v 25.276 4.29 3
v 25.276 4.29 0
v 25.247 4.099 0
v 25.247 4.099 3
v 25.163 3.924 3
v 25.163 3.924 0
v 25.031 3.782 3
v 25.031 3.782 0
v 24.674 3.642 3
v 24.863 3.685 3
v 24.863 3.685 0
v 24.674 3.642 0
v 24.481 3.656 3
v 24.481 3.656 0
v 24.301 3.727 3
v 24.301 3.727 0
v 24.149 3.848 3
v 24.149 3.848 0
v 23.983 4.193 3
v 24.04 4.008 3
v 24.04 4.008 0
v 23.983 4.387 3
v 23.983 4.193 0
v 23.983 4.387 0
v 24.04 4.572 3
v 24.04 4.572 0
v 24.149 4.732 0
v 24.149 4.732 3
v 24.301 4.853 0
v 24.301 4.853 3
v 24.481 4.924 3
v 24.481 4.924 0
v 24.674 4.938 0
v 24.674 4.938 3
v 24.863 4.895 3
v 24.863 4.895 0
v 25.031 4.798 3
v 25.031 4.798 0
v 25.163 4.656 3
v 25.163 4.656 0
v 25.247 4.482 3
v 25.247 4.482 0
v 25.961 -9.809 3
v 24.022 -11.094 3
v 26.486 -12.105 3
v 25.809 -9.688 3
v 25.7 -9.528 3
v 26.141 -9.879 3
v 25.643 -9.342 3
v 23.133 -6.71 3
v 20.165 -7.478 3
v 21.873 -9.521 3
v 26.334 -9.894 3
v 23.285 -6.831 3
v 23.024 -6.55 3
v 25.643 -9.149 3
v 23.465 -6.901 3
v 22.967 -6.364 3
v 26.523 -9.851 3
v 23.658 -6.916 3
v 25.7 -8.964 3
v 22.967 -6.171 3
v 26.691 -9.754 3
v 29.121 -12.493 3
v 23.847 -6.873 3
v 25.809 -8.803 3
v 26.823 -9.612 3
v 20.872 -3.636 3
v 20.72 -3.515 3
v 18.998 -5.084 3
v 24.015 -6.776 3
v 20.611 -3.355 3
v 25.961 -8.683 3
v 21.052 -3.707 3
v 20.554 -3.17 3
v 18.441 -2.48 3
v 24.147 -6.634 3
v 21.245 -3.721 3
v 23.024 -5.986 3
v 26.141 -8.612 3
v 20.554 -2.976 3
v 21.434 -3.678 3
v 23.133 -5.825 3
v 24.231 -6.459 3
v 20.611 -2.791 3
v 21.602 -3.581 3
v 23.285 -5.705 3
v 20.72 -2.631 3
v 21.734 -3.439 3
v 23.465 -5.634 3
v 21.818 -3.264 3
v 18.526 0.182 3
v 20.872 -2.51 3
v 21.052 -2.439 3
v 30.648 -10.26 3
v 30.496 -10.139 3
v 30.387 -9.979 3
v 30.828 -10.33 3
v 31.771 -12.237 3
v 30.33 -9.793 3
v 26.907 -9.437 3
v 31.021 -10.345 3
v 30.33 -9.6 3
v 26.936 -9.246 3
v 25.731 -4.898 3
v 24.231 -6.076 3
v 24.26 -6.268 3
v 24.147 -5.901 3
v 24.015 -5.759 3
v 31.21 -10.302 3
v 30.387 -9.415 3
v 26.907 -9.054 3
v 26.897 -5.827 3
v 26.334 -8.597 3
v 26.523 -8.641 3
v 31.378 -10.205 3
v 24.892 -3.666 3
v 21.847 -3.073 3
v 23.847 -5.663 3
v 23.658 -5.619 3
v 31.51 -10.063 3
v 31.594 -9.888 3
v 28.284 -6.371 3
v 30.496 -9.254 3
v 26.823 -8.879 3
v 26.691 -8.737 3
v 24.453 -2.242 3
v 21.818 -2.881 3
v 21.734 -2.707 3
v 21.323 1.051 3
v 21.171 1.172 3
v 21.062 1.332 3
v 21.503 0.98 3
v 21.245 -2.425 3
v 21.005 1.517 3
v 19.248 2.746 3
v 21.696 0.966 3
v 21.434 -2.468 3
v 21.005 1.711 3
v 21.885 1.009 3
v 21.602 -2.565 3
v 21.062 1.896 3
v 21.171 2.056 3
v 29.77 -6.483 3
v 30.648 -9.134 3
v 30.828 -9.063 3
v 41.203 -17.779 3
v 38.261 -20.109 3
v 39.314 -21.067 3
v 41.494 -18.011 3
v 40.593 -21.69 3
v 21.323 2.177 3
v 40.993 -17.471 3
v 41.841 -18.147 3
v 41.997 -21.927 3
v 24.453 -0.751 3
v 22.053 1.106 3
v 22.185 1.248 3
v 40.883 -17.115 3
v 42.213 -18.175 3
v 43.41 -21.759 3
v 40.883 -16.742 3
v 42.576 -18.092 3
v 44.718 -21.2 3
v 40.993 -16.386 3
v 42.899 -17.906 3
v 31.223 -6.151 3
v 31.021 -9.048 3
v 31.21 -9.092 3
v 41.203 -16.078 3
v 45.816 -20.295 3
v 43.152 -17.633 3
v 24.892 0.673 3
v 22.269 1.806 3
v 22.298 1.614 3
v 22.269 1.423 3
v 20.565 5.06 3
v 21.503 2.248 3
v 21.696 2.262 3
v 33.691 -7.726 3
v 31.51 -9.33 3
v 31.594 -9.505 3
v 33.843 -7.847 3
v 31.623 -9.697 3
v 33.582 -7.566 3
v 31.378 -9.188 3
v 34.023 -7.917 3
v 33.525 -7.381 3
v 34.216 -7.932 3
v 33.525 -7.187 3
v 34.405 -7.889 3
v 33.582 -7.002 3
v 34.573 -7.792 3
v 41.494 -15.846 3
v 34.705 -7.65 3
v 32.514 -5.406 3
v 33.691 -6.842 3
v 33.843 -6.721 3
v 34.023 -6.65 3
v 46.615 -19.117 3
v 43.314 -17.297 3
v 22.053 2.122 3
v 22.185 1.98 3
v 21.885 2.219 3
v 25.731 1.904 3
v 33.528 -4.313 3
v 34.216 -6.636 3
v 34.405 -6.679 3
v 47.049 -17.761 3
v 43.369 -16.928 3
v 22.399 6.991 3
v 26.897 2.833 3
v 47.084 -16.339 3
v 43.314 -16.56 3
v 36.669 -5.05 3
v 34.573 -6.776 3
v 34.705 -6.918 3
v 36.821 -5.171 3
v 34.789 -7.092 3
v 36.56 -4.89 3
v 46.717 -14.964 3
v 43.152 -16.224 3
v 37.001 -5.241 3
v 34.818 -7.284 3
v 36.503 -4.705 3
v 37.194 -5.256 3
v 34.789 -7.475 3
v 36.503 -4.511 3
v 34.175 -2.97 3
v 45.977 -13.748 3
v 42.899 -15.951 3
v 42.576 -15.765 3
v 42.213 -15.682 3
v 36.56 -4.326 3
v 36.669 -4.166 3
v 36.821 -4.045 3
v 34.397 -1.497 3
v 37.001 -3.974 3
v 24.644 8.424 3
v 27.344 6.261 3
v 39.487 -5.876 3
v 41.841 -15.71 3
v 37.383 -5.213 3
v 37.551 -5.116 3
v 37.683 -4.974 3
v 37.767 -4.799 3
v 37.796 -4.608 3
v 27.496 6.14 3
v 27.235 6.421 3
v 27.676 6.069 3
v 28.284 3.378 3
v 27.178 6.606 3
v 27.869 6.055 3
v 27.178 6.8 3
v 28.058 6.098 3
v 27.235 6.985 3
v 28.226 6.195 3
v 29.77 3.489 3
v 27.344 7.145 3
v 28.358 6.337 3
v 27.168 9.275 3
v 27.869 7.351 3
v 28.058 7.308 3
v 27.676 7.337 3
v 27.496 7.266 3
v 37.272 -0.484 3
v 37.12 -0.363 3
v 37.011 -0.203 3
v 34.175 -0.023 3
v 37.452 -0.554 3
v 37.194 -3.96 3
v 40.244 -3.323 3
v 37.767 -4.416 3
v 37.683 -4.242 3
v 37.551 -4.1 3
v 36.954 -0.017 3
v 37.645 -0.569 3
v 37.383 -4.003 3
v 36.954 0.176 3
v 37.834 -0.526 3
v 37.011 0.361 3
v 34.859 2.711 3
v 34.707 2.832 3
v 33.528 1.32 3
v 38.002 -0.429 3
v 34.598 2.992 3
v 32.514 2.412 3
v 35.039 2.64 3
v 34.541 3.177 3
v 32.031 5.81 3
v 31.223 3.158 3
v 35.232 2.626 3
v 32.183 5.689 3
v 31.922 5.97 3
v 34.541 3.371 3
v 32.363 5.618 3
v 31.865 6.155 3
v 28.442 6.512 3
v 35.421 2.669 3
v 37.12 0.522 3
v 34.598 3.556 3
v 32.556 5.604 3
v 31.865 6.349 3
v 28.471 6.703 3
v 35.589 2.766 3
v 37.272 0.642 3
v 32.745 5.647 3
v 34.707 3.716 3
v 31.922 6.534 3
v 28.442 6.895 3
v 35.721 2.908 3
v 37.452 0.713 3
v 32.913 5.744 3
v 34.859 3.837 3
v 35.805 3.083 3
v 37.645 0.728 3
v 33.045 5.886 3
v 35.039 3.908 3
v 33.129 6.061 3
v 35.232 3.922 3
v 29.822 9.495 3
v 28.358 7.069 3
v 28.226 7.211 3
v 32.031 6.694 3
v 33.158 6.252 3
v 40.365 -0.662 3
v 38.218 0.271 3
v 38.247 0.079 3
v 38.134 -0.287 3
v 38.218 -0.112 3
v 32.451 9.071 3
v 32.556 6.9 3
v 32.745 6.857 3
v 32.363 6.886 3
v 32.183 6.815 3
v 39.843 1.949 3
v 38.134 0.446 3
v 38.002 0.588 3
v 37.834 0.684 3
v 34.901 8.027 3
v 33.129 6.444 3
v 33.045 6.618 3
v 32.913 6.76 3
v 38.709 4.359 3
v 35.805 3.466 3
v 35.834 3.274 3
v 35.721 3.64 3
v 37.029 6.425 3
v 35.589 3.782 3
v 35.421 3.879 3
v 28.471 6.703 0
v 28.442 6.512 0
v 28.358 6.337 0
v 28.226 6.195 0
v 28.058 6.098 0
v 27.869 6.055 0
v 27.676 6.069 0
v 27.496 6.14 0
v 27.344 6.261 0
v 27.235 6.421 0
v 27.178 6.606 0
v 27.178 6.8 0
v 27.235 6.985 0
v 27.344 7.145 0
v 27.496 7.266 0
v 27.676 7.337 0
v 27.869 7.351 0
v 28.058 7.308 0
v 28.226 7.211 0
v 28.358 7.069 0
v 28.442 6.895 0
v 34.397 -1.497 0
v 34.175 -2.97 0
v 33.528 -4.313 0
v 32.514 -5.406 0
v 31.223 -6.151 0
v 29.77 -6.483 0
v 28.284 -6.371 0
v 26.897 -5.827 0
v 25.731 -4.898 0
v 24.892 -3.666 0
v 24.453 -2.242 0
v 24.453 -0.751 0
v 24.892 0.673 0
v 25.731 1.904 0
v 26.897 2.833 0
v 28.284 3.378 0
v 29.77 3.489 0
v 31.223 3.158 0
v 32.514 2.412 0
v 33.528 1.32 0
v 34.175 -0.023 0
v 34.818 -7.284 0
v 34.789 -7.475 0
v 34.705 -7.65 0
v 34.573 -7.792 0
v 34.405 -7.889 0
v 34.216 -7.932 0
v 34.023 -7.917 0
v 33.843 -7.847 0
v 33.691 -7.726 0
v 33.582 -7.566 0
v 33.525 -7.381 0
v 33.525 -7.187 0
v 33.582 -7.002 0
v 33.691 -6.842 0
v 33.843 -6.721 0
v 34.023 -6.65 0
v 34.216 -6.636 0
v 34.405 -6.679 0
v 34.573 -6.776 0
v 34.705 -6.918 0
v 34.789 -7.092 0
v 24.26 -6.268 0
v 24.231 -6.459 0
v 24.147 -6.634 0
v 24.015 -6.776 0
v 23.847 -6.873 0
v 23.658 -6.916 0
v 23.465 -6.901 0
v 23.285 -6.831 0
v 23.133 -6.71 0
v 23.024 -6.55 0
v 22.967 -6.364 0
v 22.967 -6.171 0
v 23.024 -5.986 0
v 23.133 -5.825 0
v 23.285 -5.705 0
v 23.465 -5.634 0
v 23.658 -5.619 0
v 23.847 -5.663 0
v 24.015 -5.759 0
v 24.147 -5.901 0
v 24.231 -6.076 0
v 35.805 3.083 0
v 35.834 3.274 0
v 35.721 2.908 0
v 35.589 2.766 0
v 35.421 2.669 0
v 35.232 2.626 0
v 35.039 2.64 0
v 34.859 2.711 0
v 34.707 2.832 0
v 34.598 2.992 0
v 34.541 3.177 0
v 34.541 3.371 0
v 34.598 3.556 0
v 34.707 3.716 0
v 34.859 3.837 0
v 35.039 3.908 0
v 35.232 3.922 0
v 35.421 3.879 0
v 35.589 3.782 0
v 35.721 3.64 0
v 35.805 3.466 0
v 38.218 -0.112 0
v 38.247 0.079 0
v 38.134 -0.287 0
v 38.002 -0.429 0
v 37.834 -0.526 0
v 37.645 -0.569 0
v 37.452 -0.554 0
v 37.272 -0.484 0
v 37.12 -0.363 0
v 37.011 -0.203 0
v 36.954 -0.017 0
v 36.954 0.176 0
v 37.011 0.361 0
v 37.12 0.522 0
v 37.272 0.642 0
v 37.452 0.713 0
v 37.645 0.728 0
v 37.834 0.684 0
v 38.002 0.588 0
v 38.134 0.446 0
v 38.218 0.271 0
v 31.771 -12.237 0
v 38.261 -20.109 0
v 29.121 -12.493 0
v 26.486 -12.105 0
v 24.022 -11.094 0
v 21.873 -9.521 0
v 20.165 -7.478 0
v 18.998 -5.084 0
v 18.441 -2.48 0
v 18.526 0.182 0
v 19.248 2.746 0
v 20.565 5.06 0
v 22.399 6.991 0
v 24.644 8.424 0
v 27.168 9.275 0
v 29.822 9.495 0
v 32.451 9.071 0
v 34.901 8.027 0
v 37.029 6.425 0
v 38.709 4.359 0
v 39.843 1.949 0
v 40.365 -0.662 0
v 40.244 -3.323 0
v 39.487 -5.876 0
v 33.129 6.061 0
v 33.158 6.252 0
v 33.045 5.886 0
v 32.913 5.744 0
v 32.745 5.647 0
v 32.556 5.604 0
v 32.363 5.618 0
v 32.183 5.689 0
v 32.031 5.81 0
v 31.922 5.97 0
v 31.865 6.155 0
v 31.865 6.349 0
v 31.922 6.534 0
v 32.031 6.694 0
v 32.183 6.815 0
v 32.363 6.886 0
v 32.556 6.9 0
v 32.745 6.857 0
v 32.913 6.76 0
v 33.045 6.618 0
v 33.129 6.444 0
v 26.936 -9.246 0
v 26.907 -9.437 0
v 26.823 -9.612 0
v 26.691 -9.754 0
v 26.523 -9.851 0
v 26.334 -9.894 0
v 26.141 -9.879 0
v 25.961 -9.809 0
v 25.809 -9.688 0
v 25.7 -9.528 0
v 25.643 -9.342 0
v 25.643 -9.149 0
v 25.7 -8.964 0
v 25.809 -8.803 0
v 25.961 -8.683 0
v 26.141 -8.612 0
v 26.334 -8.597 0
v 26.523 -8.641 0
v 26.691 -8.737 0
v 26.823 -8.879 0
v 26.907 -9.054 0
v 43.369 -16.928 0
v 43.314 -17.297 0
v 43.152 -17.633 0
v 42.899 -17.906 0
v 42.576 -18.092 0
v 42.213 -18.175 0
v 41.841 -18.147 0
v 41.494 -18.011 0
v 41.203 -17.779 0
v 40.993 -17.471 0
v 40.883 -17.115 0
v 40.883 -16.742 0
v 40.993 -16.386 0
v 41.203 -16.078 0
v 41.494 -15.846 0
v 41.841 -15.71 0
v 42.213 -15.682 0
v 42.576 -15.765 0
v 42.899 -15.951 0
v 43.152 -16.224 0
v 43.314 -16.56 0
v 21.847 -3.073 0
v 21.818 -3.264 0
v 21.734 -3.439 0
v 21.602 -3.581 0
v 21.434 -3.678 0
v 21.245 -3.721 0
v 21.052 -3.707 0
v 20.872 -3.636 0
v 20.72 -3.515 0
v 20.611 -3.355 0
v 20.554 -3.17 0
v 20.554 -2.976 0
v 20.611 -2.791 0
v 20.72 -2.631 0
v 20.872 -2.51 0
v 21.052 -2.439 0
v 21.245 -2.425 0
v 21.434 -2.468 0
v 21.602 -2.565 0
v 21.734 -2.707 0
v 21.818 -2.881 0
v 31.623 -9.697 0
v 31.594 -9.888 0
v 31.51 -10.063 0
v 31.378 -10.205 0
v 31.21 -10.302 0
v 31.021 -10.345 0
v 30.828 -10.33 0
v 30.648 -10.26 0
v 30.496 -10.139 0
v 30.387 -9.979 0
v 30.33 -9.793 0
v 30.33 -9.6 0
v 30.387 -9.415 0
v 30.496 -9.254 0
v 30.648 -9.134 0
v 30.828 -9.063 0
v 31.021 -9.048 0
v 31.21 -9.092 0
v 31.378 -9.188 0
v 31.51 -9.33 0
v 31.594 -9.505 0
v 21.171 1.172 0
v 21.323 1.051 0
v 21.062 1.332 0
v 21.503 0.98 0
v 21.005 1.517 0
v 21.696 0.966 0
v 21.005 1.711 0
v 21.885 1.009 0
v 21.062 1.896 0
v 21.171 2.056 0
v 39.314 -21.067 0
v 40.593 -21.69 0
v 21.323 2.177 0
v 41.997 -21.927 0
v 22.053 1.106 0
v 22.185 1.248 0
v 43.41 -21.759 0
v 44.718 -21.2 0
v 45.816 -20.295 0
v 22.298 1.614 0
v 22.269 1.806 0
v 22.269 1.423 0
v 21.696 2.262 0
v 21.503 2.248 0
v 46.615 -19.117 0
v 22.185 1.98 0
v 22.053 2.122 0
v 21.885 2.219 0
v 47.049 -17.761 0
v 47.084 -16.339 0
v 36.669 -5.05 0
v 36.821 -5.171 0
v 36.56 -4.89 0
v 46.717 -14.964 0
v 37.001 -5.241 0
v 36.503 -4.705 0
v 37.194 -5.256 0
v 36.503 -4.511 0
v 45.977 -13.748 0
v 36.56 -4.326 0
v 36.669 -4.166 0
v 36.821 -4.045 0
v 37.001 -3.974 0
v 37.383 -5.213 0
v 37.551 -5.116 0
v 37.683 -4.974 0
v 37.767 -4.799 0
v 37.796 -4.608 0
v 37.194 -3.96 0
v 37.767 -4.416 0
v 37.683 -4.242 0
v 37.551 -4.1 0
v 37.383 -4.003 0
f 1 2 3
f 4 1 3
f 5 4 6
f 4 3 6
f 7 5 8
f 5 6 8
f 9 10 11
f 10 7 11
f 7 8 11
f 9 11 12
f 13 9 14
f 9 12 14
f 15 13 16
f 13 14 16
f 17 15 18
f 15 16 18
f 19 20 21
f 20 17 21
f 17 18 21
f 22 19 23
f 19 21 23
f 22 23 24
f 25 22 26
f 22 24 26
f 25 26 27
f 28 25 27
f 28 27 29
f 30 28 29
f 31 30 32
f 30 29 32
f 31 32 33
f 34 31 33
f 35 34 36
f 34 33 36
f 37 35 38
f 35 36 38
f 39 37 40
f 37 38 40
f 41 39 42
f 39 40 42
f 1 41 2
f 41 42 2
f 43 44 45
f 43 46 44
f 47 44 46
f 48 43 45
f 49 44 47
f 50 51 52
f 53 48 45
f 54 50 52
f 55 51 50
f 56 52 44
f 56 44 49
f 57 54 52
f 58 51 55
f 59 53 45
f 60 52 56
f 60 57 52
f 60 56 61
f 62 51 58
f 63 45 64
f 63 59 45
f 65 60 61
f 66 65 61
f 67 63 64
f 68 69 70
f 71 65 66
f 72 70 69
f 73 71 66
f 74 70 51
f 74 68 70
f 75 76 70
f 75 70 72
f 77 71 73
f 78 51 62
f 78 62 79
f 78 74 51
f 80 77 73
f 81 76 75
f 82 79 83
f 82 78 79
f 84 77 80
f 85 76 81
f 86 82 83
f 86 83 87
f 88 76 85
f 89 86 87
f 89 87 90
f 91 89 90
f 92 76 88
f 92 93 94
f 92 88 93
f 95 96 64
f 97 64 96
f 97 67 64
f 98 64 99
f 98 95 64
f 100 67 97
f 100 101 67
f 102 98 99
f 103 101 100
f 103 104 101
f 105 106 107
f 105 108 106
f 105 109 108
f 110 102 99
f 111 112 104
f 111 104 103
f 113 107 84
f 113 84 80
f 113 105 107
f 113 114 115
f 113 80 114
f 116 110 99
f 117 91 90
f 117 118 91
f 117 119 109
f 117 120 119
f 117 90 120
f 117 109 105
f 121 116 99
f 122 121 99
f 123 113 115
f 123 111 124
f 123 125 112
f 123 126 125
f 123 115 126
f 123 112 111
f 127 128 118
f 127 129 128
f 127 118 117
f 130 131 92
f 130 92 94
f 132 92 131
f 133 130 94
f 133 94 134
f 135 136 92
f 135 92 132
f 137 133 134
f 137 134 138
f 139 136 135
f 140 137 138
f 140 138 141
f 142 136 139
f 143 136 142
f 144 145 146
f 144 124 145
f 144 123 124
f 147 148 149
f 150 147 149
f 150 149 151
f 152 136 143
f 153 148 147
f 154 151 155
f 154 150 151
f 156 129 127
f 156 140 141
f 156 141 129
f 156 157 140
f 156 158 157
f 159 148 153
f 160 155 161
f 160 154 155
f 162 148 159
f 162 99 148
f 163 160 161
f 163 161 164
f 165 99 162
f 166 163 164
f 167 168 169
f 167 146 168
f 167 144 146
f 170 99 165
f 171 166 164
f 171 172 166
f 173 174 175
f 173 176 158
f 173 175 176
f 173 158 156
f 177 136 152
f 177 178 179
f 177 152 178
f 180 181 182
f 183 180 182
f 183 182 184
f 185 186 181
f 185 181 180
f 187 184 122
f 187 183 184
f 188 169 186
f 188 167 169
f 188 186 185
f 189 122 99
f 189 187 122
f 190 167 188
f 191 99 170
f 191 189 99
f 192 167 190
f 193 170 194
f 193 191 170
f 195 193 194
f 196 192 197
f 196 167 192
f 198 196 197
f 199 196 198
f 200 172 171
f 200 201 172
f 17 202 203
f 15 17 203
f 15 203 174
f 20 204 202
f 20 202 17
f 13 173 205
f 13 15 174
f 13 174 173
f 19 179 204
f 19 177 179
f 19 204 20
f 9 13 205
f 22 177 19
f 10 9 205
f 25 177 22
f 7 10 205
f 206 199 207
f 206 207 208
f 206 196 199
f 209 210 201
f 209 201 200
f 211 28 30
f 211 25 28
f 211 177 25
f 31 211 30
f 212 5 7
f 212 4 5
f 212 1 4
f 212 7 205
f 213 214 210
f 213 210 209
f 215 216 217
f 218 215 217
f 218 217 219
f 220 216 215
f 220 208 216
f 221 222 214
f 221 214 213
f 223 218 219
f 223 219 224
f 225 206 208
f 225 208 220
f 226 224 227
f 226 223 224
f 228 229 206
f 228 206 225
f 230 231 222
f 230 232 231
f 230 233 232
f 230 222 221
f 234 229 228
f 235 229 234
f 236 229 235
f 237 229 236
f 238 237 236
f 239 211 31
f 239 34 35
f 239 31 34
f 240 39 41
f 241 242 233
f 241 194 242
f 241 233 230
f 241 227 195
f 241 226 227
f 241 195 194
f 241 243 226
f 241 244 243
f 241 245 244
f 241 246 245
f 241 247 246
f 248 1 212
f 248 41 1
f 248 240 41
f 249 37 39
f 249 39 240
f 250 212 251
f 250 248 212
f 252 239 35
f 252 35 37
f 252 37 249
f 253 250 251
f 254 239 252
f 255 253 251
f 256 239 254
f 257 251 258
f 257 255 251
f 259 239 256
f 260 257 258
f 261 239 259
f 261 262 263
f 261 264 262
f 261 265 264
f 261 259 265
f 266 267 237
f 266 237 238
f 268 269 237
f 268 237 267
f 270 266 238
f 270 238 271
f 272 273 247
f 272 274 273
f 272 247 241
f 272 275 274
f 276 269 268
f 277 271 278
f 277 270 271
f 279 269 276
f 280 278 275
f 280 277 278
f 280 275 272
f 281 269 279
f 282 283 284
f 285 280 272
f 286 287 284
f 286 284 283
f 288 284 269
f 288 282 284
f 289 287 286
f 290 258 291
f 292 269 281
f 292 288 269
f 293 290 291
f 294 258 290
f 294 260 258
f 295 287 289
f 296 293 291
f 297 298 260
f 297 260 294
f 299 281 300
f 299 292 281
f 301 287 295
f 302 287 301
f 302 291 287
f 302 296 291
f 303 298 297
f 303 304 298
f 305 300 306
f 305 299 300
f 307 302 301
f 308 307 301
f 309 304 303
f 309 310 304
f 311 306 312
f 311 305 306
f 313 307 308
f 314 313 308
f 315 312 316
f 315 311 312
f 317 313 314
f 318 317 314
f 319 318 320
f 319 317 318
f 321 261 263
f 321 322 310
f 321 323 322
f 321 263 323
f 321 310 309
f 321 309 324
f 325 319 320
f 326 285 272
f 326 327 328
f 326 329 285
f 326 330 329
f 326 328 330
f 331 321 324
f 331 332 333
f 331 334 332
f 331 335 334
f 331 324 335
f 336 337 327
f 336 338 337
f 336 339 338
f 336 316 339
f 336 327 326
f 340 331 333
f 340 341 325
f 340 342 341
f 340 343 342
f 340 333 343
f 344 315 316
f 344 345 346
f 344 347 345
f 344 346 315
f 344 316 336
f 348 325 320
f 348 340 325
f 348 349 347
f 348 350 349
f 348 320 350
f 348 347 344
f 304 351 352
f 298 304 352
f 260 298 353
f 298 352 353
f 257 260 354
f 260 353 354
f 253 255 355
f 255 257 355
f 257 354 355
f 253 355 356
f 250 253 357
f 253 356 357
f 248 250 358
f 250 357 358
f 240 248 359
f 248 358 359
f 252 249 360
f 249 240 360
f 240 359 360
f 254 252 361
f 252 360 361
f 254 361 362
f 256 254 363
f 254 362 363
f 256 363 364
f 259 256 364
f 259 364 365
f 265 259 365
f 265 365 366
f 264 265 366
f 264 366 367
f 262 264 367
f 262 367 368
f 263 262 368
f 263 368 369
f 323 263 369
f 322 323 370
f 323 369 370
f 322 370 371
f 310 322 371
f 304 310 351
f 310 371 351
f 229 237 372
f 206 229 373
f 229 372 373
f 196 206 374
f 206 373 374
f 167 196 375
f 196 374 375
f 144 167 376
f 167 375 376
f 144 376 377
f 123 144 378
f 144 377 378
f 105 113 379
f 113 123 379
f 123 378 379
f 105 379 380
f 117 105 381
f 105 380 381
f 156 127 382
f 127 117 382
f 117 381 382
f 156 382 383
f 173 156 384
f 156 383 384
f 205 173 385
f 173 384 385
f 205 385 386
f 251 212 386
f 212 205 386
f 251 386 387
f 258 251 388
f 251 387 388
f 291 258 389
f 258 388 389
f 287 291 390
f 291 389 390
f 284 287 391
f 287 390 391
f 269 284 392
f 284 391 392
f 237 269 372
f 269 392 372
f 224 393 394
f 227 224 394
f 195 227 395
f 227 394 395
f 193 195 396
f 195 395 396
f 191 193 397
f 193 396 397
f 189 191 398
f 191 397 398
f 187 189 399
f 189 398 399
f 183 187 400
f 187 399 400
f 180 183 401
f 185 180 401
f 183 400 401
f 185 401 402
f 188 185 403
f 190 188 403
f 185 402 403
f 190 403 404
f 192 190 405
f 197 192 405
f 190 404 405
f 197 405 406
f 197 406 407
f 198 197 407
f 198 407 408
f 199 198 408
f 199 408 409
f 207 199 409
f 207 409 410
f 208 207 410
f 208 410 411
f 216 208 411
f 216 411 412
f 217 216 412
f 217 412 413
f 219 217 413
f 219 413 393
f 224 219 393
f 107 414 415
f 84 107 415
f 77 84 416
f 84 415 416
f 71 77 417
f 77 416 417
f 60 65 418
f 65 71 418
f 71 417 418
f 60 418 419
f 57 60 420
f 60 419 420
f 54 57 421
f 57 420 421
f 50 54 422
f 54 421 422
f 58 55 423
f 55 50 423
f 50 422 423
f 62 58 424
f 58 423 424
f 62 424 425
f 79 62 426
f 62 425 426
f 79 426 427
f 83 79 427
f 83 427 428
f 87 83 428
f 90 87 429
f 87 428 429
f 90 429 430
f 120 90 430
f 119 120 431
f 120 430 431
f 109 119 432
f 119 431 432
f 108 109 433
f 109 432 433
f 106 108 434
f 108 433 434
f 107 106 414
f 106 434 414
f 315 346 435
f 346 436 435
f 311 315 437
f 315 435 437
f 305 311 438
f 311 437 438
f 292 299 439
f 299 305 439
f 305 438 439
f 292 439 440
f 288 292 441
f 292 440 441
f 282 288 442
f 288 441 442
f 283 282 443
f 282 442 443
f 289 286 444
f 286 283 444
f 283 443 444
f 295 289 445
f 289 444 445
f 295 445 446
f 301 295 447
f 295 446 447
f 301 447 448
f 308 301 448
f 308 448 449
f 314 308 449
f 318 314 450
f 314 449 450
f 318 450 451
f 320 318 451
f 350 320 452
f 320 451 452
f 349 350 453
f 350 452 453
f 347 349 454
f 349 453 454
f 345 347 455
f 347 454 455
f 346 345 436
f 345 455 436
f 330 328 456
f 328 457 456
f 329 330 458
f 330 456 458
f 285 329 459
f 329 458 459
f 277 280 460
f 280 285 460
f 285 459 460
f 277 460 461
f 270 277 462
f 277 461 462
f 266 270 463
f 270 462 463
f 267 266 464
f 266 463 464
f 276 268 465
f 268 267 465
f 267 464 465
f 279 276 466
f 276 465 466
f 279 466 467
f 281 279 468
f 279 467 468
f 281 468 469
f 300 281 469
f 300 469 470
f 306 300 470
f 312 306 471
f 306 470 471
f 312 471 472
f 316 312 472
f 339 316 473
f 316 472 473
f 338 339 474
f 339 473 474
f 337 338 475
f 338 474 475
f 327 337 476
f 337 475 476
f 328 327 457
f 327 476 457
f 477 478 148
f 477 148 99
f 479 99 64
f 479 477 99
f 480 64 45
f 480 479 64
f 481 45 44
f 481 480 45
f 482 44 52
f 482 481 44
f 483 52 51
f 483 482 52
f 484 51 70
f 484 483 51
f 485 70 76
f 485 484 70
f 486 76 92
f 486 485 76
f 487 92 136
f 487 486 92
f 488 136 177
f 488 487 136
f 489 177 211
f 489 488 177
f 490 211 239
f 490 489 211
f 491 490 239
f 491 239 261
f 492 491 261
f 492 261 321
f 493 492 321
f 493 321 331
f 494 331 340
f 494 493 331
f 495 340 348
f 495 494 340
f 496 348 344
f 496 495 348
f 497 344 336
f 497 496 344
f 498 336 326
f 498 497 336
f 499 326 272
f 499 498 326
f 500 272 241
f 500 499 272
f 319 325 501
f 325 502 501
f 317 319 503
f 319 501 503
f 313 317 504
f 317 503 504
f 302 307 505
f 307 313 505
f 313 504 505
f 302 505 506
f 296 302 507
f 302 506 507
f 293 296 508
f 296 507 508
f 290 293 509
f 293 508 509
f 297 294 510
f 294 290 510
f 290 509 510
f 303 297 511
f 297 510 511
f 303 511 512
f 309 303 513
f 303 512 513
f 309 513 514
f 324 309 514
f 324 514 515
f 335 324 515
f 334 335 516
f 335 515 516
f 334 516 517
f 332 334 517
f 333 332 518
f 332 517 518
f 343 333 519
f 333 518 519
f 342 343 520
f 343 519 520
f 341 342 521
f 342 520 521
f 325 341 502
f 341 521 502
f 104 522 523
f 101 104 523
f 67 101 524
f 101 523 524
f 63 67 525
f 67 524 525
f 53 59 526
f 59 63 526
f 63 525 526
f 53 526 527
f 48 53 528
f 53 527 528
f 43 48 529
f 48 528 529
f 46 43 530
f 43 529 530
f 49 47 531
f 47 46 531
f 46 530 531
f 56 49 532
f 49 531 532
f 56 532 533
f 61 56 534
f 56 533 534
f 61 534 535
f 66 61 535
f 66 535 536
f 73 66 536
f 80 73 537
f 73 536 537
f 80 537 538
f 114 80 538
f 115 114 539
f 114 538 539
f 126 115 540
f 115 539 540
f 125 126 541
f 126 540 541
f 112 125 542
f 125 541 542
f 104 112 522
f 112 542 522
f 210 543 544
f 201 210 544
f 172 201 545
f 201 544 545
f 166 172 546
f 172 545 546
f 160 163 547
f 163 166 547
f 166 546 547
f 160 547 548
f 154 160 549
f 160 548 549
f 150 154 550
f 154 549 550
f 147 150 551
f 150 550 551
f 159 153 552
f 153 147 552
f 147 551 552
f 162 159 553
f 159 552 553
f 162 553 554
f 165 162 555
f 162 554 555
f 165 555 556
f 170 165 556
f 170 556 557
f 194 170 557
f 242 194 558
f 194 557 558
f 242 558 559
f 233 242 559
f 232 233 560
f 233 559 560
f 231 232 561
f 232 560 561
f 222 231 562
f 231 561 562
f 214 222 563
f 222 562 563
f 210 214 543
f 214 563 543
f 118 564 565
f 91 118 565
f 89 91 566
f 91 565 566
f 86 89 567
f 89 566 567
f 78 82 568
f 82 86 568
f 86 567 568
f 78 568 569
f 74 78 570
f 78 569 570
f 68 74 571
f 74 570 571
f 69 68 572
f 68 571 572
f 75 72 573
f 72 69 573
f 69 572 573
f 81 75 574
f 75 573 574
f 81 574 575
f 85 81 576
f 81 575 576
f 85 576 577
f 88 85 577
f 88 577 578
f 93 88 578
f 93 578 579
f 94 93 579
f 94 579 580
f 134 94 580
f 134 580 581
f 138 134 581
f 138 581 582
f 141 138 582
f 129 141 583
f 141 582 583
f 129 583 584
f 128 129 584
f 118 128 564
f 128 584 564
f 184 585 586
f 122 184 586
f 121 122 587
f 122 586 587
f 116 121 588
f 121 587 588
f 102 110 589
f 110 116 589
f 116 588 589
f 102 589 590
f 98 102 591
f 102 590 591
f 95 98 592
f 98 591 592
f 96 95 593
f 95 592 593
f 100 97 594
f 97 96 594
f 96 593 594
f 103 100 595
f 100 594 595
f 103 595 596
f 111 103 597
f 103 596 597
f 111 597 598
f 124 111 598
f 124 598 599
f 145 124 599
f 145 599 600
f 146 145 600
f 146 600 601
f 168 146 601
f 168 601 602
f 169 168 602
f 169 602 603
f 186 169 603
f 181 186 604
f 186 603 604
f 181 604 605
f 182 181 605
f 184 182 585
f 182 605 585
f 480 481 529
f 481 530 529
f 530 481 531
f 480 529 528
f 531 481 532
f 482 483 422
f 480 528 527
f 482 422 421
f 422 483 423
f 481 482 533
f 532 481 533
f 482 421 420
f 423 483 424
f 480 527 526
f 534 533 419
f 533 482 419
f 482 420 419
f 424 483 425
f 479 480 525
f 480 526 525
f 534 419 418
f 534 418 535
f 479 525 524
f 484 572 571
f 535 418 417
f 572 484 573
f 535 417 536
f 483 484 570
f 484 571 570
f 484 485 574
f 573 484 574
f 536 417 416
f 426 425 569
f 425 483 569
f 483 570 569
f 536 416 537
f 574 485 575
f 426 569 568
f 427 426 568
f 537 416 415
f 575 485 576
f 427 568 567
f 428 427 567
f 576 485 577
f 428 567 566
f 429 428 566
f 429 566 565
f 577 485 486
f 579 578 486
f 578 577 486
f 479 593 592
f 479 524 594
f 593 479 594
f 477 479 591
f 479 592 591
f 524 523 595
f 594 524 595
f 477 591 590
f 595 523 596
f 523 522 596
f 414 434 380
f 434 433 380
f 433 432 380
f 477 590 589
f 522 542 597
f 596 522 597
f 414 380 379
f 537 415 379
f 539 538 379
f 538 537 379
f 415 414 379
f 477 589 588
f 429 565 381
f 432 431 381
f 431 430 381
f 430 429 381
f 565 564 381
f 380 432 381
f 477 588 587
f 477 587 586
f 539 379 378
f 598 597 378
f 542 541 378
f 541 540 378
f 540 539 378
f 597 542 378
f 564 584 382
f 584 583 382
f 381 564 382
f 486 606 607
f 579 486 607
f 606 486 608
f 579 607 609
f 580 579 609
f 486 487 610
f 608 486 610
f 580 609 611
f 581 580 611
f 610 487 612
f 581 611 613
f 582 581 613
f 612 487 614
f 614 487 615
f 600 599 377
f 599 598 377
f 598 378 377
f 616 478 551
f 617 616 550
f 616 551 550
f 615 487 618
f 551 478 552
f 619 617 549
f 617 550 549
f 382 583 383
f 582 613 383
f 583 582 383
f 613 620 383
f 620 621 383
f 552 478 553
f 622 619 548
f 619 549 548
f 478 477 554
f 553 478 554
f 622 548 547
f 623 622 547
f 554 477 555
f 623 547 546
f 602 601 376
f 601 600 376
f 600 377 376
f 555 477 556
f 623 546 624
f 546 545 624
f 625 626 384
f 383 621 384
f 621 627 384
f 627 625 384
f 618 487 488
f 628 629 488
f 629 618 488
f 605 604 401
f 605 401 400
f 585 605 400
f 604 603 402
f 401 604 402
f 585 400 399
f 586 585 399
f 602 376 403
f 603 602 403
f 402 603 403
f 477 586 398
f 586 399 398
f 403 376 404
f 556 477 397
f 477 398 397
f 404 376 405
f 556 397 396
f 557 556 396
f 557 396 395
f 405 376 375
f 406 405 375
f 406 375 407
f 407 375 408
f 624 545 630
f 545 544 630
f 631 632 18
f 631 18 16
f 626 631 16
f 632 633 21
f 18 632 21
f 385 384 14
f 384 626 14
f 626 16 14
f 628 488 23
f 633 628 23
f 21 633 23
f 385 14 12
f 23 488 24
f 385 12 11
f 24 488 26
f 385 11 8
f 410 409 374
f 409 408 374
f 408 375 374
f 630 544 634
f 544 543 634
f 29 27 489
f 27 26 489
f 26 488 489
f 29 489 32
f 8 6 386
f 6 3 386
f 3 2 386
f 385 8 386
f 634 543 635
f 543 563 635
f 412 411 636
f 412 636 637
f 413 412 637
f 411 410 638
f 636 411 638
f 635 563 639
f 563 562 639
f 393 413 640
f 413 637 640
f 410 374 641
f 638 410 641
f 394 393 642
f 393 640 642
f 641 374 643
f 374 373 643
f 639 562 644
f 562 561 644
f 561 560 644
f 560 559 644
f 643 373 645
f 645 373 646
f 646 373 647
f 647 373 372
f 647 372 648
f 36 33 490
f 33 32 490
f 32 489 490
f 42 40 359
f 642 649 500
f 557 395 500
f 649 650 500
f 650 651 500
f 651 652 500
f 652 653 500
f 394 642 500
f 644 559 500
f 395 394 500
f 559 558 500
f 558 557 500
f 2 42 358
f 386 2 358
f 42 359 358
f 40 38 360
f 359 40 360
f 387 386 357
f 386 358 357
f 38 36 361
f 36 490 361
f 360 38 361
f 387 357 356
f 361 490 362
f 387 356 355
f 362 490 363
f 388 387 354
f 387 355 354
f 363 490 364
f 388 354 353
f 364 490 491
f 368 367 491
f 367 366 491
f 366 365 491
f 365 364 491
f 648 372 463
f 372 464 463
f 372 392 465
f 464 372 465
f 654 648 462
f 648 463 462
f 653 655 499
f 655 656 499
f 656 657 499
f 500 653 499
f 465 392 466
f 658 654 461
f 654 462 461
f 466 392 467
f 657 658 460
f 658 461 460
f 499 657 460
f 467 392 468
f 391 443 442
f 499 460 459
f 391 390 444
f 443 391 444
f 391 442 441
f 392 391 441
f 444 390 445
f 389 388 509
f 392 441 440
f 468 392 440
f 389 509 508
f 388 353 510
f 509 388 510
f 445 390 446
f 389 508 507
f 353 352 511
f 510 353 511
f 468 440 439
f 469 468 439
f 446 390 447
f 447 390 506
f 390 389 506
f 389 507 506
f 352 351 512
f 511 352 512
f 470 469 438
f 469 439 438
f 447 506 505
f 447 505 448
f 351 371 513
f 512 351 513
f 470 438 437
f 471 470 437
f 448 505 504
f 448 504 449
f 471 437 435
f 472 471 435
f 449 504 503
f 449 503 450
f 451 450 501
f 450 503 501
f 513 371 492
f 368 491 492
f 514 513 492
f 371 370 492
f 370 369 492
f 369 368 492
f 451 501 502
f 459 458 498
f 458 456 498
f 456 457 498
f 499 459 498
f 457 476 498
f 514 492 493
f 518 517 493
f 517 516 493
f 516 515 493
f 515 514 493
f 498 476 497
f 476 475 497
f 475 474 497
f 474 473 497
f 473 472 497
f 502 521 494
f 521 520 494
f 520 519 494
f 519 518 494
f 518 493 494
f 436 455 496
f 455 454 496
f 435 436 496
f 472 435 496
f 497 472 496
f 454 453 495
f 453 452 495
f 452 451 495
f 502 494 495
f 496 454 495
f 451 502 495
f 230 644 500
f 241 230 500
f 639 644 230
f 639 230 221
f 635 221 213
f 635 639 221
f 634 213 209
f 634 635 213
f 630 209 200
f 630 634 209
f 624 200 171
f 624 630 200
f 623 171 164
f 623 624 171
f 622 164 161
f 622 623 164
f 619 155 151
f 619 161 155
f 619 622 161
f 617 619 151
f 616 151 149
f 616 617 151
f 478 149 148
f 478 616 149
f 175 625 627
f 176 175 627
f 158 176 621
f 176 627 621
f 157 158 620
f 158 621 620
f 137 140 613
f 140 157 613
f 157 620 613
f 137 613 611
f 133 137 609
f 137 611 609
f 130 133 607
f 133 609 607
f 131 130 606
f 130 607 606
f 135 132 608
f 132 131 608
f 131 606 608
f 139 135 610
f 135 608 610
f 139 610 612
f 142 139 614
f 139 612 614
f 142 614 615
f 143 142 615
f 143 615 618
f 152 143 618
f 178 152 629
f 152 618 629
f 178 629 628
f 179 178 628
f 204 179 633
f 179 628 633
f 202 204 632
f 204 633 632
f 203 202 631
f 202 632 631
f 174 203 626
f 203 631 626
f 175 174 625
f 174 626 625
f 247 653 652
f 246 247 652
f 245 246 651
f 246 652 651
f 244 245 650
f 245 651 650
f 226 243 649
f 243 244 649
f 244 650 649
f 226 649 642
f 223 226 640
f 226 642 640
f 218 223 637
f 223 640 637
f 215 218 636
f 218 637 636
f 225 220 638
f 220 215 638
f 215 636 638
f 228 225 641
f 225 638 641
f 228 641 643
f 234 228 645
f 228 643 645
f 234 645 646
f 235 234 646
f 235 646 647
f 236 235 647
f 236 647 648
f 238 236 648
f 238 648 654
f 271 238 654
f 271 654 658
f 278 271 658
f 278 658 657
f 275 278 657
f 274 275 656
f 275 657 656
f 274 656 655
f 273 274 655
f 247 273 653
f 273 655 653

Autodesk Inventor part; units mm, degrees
ref_plane "YZ Plane" through (0, 0, 0) normal (1, 0, 0) x (0, 1, 0)
ref_plane "XZ Plane" through (0, 0, 0) normal (0, 1, 0) x (-1, 0, 0)
ref_plane "作業平面1" through (0, 0, 0) normal (0, 0, 1) x (1, 0, 0)
sketch "スケッチ1" plane through (0, 0, 0) normal (0, 0, 1) x (1, 0, 0)
  circle A0 centre (30.9729, -9.6966) radius 0.65 projected
  circle A1 centre (27.8206, 6.7032) radius 0.65 projected
  circle A2 centre (37.1456, -4.6077) radius 0.65 projected
  circle A3 centre (23.6098, -6.2676) radius 0.65 projected
  circle A4 centre (35.1836, 3.2742) radius 0.65 projected
  circle A5 centre (21.6479, 1.6142) radius 0.65 projected
  circle A6 centre (24.6258, 4.2902) radius 0.65 projected
  circle A7 centre (34.1676, -7.2837) radius 0.65 projected
  circle A8 centre (32.5077, 6.2521) radius 0.65 projected
  circle A9 centre (26.2858, -9.2456) radius 0.65 projected
  circle A10 centre (37.5966, 0.0794) radius 0.65 projected
  circle A11 centre (21.1968, -3.0729) radius 0.65 projected
  circle A12 centre (29.3967, -1.4967) radius 1.4 projected
  circle A13 centre (29.3967, -1.4967) radius 10 projected
  circle A14 centre (29.3967, -1.4967) radius 5
  circle A15 centre (42.1192, -16.9285) radius 1.25
  line L0 (29.3967, -1.4967) -> (34.1676, -7.2837)
  circle A16 centre (42.1192, -16.9285) radius 5
  line L1 (38.2612, -20.1091) -> (25.5388, -4.6773)
  line L2 (45.9771, -13.7479) -> (33.2547, 1.6839)
  circle A17 centre (29.3967, -1.4967) radius 11
  point P0 (0, 0)
  dimension "d0" = 10
  dimension "d1" = 2.5
  dimension "d2" = 20
  dimension "d3" = 10
  dimension "d4" = 22
extrude "押し出し1" add sketch "スケッチ1" along normal blind 3 contours A13 L2 A14 L1 | A13 L1 A17 L2 | L1 A14 L2 A13 | A13 L2 A17 L1 | A17 L2 A16 L1 | A16
properties part number "hornLink"
